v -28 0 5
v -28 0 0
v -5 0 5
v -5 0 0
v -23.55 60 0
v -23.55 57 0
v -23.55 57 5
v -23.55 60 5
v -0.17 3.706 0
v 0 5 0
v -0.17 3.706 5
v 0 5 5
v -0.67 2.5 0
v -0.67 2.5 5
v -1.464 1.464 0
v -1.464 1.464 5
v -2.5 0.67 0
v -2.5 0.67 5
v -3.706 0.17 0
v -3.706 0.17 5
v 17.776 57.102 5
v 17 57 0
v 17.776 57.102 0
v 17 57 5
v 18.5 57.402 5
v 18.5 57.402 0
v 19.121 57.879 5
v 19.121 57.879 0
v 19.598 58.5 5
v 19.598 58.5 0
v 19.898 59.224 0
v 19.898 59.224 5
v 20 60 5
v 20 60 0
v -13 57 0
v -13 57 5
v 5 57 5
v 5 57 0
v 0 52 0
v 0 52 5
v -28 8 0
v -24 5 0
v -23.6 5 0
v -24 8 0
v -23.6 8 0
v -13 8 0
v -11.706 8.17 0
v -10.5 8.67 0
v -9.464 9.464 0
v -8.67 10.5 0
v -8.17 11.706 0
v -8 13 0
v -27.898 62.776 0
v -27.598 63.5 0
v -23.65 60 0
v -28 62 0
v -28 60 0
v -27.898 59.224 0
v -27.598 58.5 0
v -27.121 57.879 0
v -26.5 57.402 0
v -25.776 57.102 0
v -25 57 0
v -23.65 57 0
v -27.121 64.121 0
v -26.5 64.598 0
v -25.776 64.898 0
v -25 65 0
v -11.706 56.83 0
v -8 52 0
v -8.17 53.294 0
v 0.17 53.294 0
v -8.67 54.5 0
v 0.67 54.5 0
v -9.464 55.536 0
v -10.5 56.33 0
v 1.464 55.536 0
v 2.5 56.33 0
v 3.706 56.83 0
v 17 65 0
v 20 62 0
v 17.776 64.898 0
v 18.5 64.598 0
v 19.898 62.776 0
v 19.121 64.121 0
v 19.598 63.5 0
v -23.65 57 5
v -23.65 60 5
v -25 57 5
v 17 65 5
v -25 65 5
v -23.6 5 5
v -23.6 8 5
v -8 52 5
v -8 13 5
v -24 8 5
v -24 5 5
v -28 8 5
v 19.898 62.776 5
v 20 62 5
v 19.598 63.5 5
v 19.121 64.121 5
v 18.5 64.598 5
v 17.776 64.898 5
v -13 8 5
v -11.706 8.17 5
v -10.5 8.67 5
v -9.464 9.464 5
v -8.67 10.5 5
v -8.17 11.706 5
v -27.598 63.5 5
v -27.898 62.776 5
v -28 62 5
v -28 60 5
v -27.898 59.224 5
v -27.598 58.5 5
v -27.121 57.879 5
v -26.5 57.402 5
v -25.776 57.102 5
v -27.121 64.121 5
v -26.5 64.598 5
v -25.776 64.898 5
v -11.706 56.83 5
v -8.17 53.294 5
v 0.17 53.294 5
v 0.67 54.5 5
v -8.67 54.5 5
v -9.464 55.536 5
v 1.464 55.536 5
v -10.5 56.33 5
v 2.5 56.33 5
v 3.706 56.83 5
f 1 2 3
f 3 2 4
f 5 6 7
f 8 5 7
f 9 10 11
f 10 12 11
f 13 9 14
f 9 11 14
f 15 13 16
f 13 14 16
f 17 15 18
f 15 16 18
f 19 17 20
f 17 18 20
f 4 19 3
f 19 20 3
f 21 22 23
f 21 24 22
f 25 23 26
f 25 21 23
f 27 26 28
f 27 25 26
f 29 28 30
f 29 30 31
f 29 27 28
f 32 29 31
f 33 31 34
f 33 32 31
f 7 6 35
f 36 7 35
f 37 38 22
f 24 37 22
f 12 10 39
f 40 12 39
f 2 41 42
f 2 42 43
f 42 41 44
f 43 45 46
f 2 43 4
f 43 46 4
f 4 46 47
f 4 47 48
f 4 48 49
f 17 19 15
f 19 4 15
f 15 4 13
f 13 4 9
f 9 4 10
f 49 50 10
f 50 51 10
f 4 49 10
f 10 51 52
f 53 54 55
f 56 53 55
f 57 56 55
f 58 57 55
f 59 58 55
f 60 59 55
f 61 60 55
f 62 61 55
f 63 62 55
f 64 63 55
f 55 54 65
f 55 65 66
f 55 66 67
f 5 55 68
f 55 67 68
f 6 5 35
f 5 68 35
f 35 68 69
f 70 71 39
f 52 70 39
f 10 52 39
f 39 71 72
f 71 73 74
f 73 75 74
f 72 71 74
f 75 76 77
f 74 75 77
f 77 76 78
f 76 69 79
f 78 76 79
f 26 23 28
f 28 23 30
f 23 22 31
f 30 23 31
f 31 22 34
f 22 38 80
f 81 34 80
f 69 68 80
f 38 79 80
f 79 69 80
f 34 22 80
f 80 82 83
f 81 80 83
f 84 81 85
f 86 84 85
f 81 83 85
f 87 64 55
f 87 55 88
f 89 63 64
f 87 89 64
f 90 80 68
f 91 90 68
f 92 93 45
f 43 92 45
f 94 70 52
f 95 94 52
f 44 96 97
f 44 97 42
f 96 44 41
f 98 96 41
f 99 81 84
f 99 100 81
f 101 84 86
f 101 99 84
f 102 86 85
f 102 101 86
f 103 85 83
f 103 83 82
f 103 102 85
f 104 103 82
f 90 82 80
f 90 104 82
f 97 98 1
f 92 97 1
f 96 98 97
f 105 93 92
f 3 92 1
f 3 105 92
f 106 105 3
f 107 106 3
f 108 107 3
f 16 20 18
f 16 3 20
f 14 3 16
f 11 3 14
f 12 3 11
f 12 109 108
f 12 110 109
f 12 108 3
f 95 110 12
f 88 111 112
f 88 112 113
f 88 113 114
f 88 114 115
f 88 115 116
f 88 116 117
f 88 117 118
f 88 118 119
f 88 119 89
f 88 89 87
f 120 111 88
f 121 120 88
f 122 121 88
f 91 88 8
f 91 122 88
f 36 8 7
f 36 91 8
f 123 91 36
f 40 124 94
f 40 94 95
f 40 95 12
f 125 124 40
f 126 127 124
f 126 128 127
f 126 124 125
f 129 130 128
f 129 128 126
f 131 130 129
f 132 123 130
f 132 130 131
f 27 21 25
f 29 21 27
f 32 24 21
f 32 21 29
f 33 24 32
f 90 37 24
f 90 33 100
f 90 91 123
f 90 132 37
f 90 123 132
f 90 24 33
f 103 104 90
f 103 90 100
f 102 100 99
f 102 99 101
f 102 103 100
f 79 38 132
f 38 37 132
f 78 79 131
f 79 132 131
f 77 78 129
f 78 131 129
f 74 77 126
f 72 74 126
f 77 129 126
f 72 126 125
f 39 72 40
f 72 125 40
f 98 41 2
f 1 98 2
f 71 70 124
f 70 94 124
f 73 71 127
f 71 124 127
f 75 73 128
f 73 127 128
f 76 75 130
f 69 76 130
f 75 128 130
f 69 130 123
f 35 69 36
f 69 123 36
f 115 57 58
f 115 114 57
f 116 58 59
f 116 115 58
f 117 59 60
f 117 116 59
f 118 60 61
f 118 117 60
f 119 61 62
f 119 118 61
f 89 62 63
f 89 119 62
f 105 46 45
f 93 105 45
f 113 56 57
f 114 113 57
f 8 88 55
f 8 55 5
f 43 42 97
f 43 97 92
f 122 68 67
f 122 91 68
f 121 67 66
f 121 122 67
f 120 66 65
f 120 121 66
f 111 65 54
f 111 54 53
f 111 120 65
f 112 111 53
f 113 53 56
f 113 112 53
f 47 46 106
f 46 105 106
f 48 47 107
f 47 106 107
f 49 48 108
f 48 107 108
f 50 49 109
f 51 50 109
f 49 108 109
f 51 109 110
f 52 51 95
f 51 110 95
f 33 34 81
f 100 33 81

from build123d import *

# Parameters (mm, degrees)
BOSS_EXTRUDE1_DEPTH = 5
SKETCH2_W           = 0.4
SKETCH2_H           = 5
CUT_EXTRUDE1_DEPTH  = 3
SKETCH3_W           = 0.1
SKETCH3_H           = 5
CUT_EXTRUDE2_DEPTH  = 3
FILLET1_R           = 5
FILLET2_R           = 3


with BuildPart() as part:
    # Sketch1 → Boss-Extrude1 (new body)
    with BuildSketch(Plane.XY):
        Polygon((0, 65), (-28, 65), (-28, 57), (-8, 57), (-8, 8), (-28, 8), (-28, 0), (0, 0), (0, 57), (20, 57), (20, 65), align=None)
    extrude(amount=BOSS_EXTRUDE1_DEPTH)

    # Sketch2 → Cut-Extrude1 (cut)
    with BuildSketch(Plane(origin=(0, 8, 0), x_dir=(1, 0, 0), z_dir=(0, 1, 0))):
        with Locations((-23.8, -2.5)):
            Rectangle(SKETCH2_W, SKETCH2_H)
    extrude(amount=-CUT_EXTRUDE1_DEPTH, mode=Mode.SUBTRACT)

    # Sketch3 → Cut-Extrude2 (cut)
    with BuildSketch(Plane.XZ.offset(-57)):
        with Locations((-23.6, 2.5)):
            Rectangle(SKETCH3_W, SKETCH3_H)
    extrude(amount=-CUT_EXTRUDE2_DEPTH, mode=Mode.SUBTRACT)

    # Fillet1
    fillet1_edges = [part.edges().sort_by_distance(p)[0] for p in [
        (0, 0, 2.5),
        (-8, 8, 2.5),
        (-8, 57, 2.5),
        (0, 57, 2.5),
    ]]
    fillet(fillet1_edges, radius=FILLET1_R)

    # Fillet2
    fillet2_edges = [part.edges().sort_by_distance(p)[0] for p in [
        (-28, 57, 2.5),
        (-28, 65, 2.5),
        (20, 65, 2.5),
        (20, 57, 2.5),
    ]]
    fillet(fillet2_edges, radius=FILLET2_R)


solid = part.part
